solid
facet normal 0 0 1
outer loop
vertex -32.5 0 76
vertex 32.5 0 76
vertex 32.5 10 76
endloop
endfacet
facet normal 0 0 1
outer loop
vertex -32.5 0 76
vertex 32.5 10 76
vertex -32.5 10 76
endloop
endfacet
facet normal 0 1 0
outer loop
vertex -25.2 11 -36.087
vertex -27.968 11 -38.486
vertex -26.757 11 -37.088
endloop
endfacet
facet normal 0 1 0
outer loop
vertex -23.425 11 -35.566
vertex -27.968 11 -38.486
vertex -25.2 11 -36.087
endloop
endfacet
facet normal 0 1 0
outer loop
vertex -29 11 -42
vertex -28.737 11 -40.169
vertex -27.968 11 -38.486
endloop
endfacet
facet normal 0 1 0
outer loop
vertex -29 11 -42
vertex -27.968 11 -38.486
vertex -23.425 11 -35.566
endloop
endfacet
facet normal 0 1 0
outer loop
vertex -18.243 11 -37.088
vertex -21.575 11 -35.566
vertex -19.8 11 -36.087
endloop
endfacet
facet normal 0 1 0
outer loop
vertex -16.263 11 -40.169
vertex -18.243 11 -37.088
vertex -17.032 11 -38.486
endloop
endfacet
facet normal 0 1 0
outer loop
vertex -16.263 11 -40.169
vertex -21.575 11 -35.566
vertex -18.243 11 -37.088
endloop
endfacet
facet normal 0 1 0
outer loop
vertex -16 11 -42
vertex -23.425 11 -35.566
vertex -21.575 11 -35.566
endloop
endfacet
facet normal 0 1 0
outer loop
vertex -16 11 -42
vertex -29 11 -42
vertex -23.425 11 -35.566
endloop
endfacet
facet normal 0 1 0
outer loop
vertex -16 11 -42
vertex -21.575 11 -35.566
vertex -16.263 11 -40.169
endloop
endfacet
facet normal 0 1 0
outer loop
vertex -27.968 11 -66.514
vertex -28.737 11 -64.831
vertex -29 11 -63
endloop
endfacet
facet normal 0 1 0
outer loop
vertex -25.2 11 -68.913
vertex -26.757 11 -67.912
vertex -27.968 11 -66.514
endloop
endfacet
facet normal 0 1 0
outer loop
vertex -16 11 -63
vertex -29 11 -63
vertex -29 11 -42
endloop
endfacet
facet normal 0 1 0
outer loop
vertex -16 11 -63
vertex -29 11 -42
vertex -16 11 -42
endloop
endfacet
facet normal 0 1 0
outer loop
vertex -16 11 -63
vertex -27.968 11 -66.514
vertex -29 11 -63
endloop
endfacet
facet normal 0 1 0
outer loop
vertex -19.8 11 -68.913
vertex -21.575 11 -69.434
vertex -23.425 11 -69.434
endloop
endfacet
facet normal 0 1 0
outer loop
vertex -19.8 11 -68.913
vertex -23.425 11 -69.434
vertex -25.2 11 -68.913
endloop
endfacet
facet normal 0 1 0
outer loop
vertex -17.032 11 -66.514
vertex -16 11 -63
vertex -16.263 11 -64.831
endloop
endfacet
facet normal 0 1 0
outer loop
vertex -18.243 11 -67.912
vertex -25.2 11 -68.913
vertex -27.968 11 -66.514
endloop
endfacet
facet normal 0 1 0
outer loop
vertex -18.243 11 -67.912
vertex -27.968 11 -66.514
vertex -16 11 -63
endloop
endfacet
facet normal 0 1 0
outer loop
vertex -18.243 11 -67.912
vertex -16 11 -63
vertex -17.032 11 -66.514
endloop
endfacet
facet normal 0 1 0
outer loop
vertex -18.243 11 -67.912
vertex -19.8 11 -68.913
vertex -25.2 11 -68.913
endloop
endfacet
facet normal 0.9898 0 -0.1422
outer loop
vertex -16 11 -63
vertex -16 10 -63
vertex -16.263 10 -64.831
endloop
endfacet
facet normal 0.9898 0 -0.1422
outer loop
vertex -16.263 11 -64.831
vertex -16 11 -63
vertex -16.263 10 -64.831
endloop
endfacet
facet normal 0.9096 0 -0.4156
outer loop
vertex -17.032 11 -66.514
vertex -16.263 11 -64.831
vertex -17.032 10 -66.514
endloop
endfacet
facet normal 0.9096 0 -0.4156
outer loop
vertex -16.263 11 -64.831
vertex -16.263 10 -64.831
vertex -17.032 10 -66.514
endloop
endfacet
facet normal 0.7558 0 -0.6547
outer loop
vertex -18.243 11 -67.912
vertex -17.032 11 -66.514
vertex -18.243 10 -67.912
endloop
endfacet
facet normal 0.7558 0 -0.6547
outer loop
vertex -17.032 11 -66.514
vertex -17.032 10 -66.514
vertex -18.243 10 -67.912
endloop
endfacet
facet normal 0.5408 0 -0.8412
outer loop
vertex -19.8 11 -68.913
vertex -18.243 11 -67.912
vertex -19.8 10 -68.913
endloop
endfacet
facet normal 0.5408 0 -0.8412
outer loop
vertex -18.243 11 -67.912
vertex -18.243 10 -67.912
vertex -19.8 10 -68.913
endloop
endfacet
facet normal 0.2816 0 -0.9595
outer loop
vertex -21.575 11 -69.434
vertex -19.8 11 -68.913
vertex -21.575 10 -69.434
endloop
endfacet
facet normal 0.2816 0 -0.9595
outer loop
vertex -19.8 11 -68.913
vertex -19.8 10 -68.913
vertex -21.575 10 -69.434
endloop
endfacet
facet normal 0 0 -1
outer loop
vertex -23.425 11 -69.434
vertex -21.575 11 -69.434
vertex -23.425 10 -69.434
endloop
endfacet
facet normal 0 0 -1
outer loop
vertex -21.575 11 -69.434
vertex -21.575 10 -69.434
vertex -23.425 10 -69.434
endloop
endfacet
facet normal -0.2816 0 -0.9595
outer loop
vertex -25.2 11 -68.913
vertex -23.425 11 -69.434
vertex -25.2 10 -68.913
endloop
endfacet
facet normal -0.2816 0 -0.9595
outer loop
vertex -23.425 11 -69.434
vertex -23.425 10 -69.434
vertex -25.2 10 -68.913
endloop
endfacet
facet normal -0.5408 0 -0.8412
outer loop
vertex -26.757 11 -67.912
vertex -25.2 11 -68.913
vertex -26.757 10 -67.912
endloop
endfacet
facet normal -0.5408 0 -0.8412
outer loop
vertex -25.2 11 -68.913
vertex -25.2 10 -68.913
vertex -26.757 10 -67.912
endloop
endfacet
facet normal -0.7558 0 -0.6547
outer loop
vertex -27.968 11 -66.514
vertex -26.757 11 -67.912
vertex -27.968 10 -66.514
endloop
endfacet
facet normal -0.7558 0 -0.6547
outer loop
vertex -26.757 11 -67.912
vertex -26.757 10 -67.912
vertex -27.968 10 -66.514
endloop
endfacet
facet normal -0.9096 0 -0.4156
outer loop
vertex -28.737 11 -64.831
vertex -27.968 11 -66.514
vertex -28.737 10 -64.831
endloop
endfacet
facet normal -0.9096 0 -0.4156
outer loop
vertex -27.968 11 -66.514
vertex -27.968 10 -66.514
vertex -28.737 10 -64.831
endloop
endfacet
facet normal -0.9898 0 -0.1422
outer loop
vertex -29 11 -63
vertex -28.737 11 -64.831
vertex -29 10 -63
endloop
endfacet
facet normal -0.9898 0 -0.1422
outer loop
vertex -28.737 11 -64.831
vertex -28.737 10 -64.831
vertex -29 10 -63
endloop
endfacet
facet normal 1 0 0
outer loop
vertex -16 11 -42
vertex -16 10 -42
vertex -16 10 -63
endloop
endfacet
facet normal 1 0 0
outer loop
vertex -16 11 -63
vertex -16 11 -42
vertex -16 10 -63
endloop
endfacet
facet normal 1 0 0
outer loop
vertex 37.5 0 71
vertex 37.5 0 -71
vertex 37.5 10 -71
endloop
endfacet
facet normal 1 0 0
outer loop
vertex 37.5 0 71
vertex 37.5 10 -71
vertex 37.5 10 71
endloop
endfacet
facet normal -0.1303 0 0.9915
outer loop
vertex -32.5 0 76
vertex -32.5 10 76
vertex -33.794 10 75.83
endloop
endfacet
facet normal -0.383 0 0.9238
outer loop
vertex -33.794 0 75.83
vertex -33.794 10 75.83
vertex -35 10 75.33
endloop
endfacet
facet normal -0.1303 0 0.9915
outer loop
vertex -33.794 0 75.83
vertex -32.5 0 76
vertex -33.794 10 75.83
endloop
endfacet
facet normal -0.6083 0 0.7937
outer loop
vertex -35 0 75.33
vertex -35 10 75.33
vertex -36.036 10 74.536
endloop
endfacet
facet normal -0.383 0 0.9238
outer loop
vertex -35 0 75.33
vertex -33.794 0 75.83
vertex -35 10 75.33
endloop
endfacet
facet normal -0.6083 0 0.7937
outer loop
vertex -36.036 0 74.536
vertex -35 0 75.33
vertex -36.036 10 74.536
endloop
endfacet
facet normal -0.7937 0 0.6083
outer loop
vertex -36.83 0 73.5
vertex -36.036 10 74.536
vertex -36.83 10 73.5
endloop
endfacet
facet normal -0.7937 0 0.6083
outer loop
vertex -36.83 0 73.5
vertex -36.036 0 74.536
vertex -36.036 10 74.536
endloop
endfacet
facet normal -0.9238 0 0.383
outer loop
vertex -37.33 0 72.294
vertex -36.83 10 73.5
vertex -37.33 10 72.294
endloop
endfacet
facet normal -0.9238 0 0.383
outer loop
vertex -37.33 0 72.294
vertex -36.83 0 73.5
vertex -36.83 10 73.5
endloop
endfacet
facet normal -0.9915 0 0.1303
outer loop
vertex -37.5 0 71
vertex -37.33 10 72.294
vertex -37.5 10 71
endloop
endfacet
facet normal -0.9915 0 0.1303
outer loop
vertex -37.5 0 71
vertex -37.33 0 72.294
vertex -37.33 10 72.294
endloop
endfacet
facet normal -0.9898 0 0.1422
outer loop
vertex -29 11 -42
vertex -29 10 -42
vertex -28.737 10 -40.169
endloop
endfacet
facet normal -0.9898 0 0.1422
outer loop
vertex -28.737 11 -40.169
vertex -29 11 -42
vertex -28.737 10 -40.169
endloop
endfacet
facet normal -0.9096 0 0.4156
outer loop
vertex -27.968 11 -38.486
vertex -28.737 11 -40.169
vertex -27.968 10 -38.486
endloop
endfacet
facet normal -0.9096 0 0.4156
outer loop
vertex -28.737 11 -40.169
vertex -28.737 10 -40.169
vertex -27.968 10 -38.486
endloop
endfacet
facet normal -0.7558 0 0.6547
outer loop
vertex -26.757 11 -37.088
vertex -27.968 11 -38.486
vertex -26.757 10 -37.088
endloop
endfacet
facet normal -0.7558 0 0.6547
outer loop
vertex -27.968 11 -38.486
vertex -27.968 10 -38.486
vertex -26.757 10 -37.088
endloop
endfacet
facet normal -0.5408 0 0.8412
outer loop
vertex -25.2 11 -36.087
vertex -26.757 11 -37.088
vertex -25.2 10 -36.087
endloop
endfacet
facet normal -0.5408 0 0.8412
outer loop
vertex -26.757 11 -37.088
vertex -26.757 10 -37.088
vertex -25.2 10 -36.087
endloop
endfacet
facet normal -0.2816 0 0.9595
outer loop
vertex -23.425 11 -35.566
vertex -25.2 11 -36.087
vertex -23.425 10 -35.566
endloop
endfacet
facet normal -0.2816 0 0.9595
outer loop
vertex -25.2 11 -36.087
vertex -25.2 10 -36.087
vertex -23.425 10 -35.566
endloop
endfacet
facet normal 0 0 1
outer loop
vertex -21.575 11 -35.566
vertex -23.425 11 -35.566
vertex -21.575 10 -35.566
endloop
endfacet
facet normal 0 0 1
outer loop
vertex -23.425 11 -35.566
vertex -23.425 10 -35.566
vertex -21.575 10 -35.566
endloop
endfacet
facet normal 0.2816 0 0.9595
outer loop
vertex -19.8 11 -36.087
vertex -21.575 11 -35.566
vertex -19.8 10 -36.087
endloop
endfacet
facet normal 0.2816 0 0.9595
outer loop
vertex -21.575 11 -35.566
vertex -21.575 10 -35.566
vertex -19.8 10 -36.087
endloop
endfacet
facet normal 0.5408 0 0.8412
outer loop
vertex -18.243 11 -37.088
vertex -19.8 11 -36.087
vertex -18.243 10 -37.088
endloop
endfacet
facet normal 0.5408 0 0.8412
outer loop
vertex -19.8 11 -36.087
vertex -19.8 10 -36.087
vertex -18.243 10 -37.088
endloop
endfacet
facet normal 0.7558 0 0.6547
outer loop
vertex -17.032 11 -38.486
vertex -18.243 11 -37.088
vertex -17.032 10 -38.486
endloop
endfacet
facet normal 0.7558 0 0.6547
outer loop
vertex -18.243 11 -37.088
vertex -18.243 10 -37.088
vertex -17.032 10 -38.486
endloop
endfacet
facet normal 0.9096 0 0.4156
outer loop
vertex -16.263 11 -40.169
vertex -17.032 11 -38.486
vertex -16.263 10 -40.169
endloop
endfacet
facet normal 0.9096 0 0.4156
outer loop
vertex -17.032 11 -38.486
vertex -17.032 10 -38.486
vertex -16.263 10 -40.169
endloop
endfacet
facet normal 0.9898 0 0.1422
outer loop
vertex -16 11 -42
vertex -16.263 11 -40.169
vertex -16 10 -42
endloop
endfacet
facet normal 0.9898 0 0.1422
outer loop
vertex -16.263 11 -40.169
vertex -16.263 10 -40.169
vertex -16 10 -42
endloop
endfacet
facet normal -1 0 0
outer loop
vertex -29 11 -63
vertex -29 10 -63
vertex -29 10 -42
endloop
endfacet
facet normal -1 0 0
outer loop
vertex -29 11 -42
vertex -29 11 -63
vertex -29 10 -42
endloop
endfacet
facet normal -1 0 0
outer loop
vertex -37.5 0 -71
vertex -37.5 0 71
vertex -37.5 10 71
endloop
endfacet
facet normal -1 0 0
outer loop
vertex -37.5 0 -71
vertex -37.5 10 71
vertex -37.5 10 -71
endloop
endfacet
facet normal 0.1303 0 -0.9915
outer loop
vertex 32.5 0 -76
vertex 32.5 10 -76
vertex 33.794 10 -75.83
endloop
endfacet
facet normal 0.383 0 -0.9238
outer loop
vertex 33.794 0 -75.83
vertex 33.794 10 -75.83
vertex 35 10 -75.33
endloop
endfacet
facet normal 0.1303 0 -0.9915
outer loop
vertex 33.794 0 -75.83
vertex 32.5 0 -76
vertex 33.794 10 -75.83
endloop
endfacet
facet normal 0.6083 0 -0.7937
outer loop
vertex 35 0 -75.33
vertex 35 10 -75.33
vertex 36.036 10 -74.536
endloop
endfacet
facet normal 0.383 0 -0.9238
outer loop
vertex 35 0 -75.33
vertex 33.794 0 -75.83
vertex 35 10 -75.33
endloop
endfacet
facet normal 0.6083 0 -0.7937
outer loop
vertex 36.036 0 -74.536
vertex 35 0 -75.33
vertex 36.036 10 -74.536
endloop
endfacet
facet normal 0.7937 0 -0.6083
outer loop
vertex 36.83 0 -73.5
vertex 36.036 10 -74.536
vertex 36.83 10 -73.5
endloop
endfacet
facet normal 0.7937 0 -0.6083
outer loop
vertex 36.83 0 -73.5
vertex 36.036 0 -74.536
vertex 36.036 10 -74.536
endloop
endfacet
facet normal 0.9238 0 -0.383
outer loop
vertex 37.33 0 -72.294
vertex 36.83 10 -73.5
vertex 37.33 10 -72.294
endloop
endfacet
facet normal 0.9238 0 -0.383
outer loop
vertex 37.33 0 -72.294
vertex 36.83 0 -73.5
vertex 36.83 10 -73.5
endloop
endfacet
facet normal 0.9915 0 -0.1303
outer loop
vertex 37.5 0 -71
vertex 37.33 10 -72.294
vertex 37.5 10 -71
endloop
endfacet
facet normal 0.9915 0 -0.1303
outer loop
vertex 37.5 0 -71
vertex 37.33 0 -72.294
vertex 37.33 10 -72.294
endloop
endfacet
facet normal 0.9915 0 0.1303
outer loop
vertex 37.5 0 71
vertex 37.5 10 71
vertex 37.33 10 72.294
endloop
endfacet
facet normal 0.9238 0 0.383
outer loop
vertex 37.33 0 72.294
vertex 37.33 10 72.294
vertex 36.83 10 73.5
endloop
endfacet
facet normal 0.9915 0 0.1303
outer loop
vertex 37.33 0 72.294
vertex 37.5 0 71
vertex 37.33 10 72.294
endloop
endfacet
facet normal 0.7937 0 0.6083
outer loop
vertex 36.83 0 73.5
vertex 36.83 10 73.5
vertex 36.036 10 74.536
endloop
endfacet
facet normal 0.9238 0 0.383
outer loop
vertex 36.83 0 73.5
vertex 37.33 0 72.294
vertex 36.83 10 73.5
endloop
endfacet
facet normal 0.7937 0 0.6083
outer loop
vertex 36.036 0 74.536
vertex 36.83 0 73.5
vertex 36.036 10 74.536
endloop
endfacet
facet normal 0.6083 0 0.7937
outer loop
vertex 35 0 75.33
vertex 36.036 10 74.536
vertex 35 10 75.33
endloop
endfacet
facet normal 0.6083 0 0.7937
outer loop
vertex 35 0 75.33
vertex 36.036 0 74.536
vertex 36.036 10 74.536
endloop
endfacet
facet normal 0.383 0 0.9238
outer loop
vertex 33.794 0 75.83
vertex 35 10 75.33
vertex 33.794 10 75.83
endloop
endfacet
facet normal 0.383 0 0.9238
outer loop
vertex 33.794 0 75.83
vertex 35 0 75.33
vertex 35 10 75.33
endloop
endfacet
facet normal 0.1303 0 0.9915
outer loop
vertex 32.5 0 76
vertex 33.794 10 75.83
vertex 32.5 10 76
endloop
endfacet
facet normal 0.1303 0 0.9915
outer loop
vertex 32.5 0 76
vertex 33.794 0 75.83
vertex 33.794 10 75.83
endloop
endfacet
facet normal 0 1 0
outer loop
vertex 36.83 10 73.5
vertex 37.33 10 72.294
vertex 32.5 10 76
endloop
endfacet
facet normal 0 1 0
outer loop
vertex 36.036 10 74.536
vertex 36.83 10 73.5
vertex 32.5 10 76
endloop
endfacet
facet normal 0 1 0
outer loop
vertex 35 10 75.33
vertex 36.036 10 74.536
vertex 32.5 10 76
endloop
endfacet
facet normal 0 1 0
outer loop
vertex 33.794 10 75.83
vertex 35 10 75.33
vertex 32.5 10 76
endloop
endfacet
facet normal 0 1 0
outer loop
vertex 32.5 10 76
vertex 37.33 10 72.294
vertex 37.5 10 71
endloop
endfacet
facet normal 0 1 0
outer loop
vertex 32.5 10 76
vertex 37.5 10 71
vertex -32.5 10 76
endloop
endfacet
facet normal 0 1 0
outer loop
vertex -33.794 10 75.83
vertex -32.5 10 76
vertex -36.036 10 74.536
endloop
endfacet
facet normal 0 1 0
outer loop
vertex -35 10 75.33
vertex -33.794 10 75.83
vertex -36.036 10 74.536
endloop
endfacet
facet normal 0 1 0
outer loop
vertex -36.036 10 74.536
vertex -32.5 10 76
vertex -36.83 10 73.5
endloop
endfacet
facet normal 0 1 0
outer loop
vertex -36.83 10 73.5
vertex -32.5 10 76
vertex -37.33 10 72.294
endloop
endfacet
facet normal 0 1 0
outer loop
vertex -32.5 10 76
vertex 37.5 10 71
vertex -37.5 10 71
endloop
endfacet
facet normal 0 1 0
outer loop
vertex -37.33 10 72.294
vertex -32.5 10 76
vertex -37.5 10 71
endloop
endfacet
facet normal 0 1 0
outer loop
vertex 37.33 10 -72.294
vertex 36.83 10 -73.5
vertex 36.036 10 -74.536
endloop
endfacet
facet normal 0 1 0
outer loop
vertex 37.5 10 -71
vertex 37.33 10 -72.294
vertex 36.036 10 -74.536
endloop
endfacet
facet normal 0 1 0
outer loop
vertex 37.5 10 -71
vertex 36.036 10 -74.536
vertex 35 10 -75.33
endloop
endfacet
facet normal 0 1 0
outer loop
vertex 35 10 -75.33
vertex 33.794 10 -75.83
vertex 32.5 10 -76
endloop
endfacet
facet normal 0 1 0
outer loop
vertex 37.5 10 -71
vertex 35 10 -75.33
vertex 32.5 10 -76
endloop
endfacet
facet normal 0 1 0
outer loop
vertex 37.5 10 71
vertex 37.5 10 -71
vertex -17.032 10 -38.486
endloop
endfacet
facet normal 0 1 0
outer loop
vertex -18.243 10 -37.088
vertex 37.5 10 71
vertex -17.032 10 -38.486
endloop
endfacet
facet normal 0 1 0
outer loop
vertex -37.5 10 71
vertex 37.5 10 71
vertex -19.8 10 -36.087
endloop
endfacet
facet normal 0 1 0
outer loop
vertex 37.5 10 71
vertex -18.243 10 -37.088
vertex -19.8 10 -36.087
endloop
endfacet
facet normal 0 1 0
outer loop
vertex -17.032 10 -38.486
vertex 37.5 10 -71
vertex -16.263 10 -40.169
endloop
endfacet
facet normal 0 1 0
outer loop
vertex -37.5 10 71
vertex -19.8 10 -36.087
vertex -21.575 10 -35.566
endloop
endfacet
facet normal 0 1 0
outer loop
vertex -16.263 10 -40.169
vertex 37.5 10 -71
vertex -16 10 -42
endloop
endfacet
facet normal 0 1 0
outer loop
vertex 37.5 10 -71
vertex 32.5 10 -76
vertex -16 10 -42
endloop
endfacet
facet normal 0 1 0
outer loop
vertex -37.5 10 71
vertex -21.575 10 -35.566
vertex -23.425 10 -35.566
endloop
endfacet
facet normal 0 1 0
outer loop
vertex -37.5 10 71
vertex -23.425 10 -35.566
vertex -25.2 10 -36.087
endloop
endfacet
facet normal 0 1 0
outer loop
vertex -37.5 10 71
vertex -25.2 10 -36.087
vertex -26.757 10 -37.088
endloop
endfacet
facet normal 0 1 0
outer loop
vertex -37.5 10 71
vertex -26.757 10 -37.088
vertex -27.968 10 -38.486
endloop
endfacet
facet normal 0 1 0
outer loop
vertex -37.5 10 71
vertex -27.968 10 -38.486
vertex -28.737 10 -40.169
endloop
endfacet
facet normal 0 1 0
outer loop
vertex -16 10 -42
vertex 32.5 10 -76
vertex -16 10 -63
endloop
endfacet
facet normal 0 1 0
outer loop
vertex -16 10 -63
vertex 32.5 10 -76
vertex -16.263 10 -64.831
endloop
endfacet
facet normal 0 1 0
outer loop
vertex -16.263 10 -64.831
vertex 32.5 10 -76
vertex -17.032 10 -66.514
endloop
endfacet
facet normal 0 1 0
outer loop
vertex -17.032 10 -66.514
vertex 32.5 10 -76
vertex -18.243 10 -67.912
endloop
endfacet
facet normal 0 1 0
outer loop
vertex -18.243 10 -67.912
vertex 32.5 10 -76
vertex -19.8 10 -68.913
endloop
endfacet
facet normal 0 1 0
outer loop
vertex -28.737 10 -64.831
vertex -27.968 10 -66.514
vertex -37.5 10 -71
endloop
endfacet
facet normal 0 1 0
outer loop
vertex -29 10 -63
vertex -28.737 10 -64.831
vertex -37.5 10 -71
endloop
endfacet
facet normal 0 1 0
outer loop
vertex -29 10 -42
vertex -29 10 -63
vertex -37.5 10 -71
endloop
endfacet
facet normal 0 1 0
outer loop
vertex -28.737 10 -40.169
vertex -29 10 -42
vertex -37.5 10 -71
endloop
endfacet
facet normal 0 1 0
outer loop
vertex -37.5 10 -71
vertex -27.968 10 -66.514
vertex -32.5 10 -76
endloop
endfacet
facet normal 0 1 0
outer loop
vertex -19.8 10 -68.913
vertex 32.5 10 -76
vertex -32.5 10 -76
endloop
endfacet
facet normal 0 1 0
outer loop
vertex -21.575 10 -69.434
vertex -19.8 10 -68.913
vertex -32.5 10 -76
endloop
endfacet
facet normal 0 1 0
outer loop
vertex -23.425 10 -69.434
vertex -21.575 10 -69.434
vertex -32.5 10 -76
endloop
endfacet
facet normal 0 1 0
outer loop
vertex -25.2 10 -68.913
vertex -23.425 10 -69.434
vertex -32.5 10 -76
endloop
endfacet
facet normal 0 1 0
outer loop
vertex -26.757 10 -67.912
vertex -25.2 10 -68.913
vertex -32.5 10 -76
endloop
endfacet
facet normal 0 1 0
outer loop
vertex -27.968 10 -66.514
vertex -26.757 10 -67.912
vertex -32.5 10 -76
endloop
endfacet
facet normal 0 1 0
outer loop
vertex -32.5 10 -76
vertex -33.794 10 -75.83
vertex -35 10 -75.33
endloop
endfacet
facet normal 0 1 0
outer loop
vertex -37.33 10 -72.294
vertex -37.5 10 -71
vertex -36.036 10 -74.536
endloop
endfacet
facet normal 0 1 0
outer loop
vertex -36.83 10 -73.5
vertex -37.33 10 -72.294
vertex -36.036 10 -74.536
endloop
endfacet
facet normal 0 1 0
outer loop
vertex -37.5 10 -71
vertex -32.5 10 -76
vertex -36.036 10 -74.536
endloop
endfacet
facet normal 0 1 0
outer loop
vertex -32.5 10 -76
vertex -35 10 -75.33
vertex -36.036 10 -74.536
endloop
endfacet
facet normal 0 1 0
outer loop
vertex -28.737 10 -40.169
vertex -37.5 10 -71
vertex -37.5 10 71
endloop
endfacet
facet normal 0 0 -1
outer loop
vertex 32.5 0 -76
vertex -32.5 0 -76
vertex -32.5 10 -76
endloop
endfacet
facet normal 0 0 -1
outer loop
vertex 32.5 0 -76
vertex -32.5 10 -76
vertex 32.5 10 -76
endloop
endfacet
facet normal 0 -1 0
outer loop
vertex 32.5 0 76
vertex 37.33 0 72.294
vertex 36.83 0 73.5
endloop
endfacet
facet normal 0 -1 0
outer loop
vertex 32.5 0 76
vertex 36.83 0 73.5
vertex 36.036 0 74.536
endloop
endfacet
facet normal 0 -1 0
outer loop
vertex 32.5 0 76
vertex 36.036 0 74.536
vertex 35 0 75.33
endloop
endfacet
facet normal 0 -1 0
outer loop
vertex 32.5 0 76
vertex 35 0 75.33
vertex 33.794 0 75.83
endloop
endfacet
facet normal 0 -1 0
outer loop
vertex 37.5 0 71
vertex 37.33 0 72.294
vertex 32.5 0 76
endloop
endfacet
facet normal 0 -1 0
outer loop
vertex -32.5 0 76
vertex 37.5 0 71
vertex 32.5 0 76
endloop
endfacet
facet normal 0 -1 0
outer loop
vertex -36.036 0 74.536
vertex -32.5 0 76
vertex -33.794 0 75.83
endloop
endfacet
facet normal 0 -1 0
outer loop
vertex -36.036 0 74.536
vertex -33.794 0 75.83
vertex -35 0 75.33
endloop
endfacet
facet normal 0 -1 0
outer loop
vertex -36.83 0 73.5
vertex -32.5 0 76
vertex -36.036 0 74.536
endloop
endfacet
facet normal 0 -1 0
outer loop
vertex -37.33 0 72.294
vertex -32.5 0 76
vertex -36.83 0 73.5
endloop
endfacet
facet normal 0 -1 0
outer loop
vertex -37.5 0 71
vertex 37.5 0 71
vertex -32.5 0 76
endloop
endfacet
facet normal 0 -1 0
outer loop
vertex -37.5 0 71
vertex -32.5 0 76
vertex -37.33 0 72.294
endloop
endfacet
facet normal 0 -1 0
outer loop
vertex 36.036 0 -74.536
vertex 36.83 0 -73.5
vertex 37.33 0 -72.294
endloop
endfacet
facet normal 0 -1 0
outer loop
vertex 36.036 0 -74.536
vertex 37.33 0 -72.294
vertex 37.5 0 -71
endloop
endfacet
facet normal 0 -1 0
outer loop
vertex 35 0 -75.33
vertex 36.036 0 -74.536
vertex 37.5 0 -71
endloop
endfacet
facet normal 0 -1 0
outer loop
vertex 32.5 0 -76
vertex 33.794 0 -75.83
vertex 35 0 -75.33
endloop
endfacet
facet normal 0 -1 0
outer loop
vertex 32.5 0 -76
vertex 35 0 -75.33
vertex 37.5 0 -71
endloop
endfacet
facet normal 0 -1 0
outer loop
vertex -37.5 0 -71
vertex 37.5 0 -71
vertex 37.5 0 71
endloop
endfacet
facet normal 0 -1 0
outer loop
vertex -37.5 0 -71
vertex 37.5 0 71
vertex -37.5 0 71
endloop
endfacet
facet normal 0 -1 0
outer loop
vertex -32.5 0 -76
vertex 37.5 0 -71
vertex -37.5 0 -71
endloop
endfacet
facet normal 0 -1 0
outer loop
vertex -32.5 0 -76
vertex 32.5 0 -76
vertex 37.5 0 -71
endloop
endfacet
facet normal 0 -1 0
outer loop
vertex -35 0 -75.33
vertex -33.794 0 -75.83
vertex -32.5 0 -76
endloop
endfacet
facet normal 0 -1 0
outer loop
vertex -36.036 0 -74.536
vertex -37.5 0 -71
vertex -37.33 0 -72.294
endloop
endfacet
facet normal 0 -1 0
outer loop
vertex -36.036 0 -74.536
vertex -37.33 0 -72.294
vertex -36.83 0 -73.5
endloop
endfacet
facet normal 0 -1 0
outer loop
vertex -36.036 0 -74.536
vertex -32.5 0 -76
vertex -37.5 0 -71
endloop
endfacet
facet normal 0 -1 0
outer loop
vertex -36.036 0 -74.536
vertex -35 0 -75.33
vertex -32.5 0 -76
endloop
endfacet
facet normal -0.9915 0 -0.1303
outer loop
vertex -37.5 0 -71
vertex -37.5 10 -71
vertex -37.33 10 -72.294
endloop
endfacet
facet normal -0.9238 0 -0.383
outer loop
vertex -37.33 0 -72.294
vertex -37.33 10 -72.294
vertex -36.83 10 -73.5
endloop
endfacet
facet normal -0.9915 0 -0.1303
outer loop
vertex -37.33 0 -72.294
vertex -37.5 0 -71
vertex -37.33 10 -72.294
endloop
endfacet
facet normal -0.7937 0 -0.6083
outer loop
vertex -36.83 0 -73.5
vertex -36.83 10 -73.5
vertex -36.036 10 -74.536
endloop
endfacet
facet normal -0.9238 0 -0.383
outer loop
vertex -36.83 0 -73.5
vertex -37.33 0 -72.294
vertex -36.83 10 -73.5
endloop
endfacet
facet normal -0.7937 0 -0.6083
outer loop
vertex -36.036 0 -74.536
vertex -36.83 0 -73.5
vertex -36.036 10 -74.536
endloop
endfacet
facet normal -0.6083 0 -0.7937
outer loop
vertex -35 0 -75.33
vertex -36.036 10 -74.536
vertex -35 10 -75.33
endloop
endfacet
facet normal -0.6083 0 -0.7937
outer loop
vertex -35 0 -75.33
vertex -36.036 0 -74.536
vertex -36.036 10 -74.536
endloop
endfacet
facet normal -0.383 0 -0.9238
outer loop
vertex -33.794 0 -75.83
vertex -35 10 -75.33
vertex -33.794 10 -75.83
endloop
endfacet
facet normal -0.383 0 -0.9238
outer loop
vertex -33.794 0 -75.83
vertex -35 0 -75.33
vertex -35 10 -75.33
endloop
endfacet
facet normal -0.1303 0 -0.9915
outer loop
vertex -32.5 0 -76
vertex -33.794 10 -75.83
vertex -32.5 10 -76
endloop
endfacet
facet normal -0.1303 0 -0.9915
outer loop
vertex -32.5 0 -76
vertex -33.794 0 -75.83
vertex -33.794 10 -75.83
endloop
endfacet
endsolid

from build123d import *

# Parameters (mm, degrees)
EXTRUDE_1_DEPTH = 10
EXTRUDE_2_DEPTH = 1


with BuildPart() as part:
    # 草图1 → 凸台-拉伸1 (new body)
    with BuildSketch(Plane(origin=(0, 0, 0), x_dir=(1, 0, 0), z_dir=(0, 1, 0))):
        with BuildLine():
            Line((-32.5, 76), (32.5, 76))
            ThreePointArc((32.5, 76), (36.035533906, 74.535533906), (37.5, 71))
            Line((37.5, 71), (37.5, -71))
            ThreePointArc((37.5, -71), (36.035533906, -74.535533906), (32.5, -76))
            Line((32.5, -76), (-32.5, -76))
            ThreePointArc((-32.5, -76), (-36.035533906, -74.535533906), (-37.5, -71))
            Line((-37.5, -71), (-37.5, 71))
            ThreePointArc((-37.5, 71), (-36.035533906, 74.535533906), (-32.5, 76))
        make_face()
    extrude(amount=EXTRUDE_1_DEPTH)

    # 草图2 → 凸台-拉伸2 (add)
    with BuildSketch(Plane(origin=(0, 10, 0), x_dir=(1, 0, 0), z_dir=(0, 1, 0))):
        with BuildLine():
            Line((-29, 63), (-29, 42))
            ThreePointArc((-29, 42), (-22.5, 35.5), (-16, 42))
            Line((-16, 42), (-16, 63))
            ThreePointArc((-16, 63), (-22.5, 69.5), (-29, 63))
        make_face()
    extrude(amount=EXTRUDE_2_DEPTH)


solid = part.part
